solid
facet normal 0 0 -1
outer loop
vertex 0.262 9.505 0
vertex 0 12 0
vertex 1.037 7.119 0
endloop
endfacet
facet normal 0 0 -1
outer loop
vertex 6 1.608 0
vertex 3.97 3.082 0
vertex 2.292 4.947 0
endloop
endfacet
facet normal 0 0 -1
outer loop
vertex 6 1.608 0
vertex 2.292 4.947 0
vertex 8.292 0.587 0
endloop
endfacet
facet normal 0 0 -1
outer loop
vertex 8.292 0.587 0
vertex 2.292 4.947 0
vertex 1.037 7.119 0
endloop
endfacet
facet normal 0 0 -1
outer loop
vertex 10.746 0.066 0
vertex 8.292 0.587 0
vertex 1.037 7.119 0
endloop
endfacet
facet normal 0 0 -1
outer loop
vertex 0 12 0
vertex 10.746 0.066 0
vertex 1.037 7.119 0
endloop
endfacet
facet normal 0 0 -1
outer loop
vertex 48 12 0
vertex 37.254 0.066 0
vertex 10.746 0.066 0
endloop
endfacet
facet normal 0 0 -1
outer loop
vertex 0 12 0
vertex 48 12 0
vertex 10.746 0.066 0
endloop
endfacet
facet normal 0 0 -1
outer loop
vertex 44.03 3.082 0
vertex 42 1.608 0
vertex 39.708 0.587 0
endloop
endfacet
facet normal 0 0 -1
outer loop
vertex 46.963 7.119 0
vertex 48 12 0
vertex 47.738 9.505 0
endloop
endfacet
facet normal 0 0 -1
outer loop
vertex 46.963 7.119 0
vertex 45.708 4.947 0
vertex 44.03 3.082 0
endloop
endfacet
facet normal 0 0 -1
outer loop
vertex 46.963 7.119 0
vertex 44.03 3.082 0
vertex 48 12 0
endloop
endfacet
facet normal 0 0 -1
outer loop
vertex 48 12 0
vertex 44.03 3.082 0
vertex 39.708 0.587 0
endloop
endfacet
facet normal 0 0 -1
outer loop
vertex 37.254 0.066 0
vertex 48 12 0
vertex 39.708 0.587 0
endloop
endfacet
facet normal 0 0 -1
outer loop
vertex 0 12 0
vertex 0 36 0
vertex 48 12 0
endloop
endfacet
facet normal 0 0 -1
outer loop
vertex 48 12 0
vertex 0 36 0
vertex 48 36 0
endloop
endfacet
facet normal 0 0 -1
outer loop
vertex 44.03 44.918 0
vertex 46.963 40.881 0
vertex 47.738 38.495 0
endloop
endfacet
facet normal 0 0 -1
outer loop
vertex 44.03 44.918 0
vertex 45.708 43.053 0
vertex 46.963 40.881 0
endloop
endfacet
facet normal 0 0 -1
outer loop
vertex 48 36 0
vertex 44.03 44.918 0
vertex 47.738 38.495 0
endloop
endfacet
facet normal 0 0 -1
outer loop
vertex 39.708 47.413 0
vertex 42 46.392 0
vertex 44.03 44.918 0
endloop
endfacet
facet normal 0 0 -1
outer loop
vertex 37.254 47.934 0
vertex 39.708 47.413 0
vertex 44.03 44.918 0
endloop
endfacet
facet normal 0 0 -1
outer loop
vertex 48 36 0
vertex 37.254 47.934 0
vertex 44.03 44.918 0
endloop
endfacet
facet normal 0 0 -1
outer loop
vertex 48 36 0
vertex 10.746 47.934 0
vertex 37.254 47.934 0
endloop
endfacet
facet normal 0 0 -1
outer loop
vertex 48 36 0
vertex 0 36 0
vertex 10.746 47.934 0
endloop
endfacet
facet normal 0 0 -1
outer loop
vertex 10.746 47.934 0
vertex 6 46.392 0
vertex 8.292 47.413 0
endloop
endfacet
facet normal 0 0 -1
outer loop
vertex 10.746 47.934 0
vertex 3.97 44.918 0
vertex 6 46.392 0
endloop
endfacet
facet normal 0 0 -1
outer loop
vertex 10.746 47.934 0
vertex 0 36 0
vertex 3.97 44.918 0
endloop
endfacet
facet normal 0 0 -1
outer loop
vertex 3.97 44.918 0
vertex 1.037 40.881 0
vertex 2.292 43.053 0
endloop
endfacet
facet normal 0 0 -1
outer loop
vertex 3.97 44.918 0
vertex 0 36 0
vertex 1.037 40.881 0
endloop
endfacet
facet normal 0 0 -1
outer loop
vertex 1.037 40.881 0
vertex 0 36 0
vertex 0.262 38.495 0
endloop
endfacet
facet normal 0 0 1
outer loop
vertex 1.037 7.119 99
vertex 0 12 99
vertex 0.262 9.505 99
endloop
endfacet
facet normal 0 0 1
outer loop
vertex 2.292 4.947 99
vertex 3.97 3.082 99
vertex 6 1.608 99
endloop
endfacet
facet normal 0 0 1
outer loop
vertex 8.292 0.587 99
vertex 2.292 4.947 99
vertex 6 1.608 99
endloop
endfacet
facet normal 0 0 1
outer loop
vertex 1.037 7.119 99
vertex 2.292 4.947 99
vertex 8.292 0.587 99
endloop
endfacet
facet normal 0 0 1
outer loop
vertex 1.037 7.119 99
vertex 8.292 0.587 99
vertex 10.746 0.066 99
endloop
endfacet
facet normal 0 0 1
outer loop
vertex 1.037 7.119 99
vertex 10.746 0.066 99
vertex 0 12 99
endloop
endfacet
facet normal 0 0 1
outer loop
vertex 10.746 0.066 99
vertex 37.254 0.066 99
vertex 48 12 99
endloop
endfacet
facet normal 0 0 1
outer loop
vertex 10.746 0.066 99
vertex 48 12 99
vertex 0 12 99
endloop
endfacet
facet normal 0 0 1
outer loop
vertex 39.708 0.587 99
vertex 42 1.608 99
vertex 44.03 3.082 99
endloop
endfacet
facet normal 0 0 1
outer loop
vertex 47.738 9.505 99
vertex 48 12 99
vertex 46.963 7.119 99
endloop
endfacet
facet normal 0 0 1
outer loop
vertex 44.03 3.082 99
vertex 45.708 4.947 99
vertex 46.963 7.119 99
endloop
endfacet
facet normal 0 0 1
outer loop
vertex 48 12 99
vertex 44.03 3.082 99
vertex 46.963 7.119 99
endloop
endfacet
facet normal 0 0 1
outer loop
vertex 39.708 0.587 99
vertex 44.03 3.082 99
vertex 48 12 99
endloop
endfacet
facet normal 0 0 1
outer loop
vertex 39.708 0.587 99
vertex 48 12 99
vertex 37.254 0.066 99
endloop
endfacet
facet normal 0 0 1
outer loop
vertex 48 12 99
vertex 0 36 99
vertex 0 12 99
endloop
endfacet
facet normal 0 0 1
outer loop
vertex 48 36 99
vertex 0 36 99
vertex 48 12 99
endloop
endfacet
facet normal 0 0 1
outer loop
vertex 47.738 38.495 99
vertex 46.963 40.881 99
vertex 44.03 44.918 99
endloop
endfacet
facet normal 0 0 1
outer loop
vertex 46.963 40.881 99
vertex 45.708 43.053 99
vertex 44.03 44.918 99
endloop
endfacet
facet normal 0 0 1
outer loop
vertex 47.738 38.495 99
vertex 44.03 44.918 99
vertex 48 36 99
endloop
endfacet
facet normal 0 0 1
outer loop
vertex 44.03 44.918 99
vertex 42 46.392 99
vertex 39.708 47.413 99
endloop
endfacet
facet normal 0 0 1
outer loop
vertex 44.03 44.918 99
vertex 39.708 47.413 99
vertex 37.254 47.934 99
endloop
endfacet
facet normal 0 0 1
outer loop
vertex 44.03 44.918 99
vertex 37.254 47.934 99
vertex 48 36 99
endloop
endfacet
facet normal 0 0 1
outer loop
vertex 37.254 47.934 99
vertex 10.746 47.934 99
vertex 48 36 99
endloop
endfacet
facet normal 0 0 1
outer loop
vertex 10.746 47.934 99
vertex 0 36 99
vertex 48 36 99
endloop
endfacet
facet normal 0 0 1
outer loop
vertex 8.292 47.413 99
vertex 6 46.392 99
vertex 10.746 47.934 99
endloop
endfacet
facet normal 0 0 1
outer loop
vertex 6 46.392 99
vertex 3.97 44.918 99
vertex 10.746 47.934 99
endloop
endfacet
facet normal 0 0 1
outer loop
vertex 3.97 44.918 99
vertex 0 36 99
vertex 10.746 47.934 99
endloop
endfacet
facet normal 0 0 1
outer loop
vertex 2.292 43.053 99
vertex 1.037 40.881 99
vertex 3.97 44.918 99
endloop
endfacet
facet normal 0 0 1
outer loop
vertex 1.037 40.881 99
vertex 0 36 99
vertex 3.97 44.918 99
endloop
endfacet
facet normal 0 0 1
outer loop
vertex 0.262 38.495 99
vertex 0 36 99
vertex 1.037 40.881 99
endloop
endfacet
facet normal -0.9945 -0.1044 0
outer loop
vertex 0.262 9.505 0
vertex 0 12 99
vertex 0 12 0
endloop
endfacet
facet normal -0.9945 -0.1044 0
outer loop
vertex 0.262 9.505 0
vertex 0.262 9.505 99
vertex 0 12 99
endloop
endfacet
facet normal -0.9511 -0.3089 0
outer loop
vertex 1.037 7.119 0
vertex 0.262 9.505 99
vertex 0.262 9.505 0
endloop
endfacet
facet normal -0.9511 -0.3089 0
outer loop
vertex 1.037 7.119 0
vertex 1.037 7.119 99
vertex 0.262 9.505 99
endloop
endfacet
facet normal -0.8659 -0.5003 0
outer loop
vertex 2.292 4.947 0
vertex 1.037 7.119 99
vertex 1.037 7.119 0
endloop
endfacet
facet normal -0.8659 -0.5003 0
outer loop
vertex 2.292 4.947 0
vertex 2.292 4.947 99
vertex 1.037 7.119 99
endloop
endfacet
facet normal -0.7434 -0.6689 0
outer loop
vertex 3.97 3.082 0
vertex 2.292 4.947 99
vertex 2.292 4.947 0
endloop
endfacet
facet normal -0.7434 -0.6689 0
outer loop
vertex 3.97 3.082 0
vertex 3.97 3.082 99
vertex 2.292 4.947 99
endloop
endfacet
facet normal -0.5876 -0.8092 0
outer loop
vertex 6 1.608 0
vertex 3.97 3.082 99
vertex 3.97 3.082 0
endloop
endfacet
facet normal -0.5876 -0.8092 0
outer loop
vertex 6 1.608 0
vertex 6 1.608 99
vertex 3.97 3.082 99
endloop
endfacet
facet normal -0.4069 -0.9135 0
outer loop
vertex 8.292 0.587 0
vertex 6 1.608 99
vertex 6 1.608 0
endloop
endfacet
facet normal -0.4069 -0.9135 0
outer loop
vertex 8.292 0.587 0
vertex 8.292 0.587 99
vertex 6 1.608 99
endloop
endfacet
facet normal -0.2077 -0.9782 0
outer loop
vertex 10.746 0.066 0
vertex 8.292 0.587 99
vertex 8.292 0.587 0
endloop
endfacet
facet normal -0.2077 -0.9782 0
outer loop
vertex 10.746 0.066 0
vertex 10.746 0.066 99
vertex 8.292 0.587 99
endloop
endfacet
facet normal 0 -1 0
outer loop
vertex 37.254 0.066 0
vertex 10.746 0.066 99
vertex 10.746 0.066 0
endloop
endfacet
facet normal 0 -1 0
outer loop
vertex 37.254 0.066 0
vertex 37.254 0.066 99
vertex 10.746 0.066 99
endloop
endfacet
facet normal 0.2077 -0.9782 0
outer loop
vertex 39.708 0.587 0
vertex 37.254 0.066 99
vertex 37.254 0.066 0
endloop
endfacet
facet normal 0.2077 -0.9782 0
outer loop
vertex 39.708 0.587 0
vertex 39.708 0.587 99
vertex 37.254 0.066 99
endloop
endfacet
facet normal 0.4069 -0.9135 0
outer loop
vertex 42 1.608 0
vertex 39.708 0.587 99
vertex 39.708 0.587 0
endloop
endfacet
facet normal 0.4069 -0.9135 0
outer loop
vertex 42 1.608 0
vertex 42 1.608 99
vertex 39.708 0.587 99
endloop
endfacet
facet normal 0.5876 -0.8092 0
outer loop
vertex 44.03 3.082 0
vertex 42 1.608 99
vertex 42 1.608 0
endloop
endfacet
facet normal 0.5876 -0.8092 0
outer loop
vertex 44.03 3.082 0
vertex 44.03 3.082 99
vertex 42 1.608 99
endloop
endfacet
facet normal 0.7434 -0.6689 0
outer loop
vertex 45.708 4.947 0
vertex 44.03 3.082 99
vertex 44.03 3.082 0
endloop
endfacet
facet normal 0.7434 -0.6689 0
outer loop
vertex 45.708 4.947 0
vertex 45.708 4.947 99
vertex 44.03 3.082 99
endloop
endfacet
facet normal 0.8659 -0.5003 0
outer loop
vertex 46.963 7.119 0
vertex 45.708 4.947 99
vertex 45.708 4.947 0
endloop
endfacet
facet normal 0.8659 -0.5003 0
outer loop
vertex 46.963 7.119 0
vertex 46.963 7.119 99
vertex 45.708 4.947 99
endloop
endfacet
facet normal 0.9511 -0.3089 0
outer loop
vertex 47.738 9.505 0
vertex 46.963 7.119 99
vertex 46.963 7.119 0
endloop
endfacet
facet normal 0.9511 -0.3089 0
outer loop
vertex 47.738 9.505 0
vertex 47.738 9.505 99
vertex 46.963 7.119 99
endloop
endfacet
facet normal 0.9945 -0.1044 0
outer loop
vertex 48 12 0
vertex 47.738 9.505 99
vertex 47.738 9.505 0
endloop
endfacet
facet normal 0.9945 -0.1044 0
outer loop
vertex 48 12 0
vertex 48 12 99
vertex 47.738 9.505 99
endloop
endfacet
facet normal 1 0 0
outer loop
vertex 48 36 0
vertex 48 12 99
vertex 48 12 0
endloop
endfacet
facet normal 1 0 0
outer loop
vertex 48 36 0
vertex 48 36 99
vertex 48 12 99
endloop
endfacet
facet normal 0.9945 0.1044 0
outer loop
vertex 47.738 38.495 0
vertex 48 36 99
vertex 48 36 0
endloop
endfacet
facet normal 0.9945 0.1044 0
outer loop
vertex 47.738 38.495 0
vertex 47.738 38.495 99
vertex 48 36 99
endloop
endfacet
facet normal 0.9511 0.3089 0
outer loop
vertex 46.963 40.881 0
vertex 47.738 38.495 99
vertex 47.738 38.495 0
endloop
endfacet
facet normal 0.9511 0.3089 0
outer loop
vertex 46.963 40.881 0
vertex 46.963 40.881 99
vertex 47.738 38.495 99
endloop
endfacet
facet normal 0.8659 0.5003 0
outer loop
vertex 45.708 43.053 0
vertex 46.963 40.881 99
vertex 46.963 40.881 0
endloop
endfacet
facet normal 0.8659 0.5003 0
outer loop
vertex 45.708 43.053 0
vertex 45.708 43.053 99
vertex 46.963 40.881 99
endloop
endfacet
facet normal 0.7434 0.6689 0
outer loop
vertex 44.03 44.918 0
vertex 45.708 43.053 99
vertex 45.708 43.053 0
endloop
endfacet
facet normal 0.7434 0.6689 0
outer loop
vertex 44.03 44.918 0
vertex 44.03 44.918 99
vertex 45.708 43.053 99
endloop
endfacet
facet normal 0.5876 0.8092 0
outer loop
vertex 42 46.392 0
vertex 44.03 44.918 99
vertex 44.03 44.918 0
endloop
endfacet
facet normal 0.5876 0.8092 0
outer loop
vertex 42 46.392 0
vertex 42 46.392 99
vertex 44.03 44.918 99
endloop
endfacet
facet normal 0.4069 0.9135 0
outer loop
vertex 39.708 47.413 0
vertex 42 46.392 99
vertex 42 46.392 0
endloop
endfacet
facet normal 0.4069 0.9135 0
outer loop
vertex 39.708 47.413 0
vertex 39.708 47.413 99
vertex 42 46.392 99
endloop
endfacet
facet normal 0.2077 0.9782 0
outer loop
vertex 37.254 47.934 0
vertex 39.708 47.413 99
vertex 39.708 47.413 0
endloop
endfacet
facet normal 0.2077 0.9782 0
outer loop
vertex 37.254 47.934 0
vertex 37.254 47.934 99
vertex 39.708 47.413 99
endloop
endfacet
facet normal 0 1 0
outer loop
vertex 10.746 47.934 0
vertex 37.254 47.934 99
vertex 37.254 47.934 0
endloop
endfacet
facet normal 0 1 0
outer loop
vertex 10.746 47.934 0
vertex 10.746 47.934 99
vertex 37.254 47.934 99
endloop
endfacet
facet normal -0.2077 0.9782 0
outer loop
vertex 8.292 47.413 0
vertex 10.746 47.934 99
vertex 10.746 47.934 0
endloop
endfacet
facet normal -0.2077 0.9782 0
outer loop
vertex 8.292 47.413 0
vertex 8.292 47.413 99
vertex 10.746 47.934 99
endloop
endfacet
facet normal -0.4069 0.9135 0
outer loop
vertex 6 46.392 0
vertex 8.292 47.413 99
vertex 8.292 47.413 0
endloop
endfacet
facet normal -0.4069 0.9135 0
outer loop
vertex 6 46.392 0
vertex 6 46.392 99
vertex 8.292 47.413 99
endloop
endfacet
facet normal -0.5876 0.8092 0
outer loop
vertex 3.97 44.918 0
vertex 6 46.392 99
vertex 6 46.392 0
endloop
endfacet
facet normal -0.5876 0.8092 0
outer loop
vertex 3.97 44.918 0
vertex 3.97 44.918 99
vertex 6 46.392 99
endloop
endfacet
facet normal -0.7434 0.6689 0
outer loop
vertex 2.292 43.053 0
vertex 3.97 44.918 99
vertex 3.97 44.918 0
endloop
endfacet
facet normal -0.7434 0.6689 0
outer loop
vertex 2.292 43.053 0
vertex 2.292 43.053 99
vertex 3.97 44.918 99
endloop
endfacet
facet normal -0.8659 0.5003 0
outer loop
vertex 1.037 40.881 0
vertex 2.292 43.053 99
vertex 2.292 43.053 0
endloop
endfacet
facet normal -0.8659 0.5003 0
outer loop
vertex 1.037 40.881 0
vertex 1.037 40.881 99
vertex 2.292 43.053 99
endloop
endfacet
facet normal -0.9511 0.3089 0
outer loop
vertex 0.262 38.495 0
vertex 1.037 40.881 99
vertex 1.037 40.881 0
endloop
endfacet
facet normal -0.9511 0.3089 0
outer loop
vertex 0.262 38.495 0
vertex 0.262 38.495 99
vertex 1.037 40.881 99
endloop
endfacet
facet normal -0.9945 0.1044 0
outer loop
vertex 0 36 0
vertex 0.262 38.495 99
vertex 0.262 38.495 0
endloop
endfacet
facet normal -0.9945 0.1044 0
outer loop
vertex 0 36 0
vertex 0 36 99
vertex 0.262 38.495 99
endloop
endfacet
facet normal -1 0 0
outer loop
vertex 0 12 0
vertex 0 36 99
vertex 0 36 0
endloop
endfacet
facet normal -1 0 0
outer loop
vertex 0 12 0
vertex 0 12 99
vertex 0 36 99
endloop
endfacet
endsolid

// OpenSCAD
function jar_height() = 99; // millimeters
function jar_width() = 48;
function jar_round_edge_radius() = 12;

module jar() {
    linear_extrude(height = jar_height())
    hull() {
        translate([jar_round_edge_radius(), jar_round_edge_radius()]) circle(r = jar_round_edge_radius());
        translate([jar_width() - jar_round_edge_radius(), jar_round_edge_radius()]) circle(r = jar_round_edge_radius());
        translate([jar_width() - jar_round_edge_radius(), jar_width() - jar_round_edge_radius()]) circle(r = jar_round_edge_radius());
        translate([jar_round_edge_radius(), jar_width() - jar_round_edge_radius()]) circle(r = jar_round_edge_radius());
    }
}

jar();
